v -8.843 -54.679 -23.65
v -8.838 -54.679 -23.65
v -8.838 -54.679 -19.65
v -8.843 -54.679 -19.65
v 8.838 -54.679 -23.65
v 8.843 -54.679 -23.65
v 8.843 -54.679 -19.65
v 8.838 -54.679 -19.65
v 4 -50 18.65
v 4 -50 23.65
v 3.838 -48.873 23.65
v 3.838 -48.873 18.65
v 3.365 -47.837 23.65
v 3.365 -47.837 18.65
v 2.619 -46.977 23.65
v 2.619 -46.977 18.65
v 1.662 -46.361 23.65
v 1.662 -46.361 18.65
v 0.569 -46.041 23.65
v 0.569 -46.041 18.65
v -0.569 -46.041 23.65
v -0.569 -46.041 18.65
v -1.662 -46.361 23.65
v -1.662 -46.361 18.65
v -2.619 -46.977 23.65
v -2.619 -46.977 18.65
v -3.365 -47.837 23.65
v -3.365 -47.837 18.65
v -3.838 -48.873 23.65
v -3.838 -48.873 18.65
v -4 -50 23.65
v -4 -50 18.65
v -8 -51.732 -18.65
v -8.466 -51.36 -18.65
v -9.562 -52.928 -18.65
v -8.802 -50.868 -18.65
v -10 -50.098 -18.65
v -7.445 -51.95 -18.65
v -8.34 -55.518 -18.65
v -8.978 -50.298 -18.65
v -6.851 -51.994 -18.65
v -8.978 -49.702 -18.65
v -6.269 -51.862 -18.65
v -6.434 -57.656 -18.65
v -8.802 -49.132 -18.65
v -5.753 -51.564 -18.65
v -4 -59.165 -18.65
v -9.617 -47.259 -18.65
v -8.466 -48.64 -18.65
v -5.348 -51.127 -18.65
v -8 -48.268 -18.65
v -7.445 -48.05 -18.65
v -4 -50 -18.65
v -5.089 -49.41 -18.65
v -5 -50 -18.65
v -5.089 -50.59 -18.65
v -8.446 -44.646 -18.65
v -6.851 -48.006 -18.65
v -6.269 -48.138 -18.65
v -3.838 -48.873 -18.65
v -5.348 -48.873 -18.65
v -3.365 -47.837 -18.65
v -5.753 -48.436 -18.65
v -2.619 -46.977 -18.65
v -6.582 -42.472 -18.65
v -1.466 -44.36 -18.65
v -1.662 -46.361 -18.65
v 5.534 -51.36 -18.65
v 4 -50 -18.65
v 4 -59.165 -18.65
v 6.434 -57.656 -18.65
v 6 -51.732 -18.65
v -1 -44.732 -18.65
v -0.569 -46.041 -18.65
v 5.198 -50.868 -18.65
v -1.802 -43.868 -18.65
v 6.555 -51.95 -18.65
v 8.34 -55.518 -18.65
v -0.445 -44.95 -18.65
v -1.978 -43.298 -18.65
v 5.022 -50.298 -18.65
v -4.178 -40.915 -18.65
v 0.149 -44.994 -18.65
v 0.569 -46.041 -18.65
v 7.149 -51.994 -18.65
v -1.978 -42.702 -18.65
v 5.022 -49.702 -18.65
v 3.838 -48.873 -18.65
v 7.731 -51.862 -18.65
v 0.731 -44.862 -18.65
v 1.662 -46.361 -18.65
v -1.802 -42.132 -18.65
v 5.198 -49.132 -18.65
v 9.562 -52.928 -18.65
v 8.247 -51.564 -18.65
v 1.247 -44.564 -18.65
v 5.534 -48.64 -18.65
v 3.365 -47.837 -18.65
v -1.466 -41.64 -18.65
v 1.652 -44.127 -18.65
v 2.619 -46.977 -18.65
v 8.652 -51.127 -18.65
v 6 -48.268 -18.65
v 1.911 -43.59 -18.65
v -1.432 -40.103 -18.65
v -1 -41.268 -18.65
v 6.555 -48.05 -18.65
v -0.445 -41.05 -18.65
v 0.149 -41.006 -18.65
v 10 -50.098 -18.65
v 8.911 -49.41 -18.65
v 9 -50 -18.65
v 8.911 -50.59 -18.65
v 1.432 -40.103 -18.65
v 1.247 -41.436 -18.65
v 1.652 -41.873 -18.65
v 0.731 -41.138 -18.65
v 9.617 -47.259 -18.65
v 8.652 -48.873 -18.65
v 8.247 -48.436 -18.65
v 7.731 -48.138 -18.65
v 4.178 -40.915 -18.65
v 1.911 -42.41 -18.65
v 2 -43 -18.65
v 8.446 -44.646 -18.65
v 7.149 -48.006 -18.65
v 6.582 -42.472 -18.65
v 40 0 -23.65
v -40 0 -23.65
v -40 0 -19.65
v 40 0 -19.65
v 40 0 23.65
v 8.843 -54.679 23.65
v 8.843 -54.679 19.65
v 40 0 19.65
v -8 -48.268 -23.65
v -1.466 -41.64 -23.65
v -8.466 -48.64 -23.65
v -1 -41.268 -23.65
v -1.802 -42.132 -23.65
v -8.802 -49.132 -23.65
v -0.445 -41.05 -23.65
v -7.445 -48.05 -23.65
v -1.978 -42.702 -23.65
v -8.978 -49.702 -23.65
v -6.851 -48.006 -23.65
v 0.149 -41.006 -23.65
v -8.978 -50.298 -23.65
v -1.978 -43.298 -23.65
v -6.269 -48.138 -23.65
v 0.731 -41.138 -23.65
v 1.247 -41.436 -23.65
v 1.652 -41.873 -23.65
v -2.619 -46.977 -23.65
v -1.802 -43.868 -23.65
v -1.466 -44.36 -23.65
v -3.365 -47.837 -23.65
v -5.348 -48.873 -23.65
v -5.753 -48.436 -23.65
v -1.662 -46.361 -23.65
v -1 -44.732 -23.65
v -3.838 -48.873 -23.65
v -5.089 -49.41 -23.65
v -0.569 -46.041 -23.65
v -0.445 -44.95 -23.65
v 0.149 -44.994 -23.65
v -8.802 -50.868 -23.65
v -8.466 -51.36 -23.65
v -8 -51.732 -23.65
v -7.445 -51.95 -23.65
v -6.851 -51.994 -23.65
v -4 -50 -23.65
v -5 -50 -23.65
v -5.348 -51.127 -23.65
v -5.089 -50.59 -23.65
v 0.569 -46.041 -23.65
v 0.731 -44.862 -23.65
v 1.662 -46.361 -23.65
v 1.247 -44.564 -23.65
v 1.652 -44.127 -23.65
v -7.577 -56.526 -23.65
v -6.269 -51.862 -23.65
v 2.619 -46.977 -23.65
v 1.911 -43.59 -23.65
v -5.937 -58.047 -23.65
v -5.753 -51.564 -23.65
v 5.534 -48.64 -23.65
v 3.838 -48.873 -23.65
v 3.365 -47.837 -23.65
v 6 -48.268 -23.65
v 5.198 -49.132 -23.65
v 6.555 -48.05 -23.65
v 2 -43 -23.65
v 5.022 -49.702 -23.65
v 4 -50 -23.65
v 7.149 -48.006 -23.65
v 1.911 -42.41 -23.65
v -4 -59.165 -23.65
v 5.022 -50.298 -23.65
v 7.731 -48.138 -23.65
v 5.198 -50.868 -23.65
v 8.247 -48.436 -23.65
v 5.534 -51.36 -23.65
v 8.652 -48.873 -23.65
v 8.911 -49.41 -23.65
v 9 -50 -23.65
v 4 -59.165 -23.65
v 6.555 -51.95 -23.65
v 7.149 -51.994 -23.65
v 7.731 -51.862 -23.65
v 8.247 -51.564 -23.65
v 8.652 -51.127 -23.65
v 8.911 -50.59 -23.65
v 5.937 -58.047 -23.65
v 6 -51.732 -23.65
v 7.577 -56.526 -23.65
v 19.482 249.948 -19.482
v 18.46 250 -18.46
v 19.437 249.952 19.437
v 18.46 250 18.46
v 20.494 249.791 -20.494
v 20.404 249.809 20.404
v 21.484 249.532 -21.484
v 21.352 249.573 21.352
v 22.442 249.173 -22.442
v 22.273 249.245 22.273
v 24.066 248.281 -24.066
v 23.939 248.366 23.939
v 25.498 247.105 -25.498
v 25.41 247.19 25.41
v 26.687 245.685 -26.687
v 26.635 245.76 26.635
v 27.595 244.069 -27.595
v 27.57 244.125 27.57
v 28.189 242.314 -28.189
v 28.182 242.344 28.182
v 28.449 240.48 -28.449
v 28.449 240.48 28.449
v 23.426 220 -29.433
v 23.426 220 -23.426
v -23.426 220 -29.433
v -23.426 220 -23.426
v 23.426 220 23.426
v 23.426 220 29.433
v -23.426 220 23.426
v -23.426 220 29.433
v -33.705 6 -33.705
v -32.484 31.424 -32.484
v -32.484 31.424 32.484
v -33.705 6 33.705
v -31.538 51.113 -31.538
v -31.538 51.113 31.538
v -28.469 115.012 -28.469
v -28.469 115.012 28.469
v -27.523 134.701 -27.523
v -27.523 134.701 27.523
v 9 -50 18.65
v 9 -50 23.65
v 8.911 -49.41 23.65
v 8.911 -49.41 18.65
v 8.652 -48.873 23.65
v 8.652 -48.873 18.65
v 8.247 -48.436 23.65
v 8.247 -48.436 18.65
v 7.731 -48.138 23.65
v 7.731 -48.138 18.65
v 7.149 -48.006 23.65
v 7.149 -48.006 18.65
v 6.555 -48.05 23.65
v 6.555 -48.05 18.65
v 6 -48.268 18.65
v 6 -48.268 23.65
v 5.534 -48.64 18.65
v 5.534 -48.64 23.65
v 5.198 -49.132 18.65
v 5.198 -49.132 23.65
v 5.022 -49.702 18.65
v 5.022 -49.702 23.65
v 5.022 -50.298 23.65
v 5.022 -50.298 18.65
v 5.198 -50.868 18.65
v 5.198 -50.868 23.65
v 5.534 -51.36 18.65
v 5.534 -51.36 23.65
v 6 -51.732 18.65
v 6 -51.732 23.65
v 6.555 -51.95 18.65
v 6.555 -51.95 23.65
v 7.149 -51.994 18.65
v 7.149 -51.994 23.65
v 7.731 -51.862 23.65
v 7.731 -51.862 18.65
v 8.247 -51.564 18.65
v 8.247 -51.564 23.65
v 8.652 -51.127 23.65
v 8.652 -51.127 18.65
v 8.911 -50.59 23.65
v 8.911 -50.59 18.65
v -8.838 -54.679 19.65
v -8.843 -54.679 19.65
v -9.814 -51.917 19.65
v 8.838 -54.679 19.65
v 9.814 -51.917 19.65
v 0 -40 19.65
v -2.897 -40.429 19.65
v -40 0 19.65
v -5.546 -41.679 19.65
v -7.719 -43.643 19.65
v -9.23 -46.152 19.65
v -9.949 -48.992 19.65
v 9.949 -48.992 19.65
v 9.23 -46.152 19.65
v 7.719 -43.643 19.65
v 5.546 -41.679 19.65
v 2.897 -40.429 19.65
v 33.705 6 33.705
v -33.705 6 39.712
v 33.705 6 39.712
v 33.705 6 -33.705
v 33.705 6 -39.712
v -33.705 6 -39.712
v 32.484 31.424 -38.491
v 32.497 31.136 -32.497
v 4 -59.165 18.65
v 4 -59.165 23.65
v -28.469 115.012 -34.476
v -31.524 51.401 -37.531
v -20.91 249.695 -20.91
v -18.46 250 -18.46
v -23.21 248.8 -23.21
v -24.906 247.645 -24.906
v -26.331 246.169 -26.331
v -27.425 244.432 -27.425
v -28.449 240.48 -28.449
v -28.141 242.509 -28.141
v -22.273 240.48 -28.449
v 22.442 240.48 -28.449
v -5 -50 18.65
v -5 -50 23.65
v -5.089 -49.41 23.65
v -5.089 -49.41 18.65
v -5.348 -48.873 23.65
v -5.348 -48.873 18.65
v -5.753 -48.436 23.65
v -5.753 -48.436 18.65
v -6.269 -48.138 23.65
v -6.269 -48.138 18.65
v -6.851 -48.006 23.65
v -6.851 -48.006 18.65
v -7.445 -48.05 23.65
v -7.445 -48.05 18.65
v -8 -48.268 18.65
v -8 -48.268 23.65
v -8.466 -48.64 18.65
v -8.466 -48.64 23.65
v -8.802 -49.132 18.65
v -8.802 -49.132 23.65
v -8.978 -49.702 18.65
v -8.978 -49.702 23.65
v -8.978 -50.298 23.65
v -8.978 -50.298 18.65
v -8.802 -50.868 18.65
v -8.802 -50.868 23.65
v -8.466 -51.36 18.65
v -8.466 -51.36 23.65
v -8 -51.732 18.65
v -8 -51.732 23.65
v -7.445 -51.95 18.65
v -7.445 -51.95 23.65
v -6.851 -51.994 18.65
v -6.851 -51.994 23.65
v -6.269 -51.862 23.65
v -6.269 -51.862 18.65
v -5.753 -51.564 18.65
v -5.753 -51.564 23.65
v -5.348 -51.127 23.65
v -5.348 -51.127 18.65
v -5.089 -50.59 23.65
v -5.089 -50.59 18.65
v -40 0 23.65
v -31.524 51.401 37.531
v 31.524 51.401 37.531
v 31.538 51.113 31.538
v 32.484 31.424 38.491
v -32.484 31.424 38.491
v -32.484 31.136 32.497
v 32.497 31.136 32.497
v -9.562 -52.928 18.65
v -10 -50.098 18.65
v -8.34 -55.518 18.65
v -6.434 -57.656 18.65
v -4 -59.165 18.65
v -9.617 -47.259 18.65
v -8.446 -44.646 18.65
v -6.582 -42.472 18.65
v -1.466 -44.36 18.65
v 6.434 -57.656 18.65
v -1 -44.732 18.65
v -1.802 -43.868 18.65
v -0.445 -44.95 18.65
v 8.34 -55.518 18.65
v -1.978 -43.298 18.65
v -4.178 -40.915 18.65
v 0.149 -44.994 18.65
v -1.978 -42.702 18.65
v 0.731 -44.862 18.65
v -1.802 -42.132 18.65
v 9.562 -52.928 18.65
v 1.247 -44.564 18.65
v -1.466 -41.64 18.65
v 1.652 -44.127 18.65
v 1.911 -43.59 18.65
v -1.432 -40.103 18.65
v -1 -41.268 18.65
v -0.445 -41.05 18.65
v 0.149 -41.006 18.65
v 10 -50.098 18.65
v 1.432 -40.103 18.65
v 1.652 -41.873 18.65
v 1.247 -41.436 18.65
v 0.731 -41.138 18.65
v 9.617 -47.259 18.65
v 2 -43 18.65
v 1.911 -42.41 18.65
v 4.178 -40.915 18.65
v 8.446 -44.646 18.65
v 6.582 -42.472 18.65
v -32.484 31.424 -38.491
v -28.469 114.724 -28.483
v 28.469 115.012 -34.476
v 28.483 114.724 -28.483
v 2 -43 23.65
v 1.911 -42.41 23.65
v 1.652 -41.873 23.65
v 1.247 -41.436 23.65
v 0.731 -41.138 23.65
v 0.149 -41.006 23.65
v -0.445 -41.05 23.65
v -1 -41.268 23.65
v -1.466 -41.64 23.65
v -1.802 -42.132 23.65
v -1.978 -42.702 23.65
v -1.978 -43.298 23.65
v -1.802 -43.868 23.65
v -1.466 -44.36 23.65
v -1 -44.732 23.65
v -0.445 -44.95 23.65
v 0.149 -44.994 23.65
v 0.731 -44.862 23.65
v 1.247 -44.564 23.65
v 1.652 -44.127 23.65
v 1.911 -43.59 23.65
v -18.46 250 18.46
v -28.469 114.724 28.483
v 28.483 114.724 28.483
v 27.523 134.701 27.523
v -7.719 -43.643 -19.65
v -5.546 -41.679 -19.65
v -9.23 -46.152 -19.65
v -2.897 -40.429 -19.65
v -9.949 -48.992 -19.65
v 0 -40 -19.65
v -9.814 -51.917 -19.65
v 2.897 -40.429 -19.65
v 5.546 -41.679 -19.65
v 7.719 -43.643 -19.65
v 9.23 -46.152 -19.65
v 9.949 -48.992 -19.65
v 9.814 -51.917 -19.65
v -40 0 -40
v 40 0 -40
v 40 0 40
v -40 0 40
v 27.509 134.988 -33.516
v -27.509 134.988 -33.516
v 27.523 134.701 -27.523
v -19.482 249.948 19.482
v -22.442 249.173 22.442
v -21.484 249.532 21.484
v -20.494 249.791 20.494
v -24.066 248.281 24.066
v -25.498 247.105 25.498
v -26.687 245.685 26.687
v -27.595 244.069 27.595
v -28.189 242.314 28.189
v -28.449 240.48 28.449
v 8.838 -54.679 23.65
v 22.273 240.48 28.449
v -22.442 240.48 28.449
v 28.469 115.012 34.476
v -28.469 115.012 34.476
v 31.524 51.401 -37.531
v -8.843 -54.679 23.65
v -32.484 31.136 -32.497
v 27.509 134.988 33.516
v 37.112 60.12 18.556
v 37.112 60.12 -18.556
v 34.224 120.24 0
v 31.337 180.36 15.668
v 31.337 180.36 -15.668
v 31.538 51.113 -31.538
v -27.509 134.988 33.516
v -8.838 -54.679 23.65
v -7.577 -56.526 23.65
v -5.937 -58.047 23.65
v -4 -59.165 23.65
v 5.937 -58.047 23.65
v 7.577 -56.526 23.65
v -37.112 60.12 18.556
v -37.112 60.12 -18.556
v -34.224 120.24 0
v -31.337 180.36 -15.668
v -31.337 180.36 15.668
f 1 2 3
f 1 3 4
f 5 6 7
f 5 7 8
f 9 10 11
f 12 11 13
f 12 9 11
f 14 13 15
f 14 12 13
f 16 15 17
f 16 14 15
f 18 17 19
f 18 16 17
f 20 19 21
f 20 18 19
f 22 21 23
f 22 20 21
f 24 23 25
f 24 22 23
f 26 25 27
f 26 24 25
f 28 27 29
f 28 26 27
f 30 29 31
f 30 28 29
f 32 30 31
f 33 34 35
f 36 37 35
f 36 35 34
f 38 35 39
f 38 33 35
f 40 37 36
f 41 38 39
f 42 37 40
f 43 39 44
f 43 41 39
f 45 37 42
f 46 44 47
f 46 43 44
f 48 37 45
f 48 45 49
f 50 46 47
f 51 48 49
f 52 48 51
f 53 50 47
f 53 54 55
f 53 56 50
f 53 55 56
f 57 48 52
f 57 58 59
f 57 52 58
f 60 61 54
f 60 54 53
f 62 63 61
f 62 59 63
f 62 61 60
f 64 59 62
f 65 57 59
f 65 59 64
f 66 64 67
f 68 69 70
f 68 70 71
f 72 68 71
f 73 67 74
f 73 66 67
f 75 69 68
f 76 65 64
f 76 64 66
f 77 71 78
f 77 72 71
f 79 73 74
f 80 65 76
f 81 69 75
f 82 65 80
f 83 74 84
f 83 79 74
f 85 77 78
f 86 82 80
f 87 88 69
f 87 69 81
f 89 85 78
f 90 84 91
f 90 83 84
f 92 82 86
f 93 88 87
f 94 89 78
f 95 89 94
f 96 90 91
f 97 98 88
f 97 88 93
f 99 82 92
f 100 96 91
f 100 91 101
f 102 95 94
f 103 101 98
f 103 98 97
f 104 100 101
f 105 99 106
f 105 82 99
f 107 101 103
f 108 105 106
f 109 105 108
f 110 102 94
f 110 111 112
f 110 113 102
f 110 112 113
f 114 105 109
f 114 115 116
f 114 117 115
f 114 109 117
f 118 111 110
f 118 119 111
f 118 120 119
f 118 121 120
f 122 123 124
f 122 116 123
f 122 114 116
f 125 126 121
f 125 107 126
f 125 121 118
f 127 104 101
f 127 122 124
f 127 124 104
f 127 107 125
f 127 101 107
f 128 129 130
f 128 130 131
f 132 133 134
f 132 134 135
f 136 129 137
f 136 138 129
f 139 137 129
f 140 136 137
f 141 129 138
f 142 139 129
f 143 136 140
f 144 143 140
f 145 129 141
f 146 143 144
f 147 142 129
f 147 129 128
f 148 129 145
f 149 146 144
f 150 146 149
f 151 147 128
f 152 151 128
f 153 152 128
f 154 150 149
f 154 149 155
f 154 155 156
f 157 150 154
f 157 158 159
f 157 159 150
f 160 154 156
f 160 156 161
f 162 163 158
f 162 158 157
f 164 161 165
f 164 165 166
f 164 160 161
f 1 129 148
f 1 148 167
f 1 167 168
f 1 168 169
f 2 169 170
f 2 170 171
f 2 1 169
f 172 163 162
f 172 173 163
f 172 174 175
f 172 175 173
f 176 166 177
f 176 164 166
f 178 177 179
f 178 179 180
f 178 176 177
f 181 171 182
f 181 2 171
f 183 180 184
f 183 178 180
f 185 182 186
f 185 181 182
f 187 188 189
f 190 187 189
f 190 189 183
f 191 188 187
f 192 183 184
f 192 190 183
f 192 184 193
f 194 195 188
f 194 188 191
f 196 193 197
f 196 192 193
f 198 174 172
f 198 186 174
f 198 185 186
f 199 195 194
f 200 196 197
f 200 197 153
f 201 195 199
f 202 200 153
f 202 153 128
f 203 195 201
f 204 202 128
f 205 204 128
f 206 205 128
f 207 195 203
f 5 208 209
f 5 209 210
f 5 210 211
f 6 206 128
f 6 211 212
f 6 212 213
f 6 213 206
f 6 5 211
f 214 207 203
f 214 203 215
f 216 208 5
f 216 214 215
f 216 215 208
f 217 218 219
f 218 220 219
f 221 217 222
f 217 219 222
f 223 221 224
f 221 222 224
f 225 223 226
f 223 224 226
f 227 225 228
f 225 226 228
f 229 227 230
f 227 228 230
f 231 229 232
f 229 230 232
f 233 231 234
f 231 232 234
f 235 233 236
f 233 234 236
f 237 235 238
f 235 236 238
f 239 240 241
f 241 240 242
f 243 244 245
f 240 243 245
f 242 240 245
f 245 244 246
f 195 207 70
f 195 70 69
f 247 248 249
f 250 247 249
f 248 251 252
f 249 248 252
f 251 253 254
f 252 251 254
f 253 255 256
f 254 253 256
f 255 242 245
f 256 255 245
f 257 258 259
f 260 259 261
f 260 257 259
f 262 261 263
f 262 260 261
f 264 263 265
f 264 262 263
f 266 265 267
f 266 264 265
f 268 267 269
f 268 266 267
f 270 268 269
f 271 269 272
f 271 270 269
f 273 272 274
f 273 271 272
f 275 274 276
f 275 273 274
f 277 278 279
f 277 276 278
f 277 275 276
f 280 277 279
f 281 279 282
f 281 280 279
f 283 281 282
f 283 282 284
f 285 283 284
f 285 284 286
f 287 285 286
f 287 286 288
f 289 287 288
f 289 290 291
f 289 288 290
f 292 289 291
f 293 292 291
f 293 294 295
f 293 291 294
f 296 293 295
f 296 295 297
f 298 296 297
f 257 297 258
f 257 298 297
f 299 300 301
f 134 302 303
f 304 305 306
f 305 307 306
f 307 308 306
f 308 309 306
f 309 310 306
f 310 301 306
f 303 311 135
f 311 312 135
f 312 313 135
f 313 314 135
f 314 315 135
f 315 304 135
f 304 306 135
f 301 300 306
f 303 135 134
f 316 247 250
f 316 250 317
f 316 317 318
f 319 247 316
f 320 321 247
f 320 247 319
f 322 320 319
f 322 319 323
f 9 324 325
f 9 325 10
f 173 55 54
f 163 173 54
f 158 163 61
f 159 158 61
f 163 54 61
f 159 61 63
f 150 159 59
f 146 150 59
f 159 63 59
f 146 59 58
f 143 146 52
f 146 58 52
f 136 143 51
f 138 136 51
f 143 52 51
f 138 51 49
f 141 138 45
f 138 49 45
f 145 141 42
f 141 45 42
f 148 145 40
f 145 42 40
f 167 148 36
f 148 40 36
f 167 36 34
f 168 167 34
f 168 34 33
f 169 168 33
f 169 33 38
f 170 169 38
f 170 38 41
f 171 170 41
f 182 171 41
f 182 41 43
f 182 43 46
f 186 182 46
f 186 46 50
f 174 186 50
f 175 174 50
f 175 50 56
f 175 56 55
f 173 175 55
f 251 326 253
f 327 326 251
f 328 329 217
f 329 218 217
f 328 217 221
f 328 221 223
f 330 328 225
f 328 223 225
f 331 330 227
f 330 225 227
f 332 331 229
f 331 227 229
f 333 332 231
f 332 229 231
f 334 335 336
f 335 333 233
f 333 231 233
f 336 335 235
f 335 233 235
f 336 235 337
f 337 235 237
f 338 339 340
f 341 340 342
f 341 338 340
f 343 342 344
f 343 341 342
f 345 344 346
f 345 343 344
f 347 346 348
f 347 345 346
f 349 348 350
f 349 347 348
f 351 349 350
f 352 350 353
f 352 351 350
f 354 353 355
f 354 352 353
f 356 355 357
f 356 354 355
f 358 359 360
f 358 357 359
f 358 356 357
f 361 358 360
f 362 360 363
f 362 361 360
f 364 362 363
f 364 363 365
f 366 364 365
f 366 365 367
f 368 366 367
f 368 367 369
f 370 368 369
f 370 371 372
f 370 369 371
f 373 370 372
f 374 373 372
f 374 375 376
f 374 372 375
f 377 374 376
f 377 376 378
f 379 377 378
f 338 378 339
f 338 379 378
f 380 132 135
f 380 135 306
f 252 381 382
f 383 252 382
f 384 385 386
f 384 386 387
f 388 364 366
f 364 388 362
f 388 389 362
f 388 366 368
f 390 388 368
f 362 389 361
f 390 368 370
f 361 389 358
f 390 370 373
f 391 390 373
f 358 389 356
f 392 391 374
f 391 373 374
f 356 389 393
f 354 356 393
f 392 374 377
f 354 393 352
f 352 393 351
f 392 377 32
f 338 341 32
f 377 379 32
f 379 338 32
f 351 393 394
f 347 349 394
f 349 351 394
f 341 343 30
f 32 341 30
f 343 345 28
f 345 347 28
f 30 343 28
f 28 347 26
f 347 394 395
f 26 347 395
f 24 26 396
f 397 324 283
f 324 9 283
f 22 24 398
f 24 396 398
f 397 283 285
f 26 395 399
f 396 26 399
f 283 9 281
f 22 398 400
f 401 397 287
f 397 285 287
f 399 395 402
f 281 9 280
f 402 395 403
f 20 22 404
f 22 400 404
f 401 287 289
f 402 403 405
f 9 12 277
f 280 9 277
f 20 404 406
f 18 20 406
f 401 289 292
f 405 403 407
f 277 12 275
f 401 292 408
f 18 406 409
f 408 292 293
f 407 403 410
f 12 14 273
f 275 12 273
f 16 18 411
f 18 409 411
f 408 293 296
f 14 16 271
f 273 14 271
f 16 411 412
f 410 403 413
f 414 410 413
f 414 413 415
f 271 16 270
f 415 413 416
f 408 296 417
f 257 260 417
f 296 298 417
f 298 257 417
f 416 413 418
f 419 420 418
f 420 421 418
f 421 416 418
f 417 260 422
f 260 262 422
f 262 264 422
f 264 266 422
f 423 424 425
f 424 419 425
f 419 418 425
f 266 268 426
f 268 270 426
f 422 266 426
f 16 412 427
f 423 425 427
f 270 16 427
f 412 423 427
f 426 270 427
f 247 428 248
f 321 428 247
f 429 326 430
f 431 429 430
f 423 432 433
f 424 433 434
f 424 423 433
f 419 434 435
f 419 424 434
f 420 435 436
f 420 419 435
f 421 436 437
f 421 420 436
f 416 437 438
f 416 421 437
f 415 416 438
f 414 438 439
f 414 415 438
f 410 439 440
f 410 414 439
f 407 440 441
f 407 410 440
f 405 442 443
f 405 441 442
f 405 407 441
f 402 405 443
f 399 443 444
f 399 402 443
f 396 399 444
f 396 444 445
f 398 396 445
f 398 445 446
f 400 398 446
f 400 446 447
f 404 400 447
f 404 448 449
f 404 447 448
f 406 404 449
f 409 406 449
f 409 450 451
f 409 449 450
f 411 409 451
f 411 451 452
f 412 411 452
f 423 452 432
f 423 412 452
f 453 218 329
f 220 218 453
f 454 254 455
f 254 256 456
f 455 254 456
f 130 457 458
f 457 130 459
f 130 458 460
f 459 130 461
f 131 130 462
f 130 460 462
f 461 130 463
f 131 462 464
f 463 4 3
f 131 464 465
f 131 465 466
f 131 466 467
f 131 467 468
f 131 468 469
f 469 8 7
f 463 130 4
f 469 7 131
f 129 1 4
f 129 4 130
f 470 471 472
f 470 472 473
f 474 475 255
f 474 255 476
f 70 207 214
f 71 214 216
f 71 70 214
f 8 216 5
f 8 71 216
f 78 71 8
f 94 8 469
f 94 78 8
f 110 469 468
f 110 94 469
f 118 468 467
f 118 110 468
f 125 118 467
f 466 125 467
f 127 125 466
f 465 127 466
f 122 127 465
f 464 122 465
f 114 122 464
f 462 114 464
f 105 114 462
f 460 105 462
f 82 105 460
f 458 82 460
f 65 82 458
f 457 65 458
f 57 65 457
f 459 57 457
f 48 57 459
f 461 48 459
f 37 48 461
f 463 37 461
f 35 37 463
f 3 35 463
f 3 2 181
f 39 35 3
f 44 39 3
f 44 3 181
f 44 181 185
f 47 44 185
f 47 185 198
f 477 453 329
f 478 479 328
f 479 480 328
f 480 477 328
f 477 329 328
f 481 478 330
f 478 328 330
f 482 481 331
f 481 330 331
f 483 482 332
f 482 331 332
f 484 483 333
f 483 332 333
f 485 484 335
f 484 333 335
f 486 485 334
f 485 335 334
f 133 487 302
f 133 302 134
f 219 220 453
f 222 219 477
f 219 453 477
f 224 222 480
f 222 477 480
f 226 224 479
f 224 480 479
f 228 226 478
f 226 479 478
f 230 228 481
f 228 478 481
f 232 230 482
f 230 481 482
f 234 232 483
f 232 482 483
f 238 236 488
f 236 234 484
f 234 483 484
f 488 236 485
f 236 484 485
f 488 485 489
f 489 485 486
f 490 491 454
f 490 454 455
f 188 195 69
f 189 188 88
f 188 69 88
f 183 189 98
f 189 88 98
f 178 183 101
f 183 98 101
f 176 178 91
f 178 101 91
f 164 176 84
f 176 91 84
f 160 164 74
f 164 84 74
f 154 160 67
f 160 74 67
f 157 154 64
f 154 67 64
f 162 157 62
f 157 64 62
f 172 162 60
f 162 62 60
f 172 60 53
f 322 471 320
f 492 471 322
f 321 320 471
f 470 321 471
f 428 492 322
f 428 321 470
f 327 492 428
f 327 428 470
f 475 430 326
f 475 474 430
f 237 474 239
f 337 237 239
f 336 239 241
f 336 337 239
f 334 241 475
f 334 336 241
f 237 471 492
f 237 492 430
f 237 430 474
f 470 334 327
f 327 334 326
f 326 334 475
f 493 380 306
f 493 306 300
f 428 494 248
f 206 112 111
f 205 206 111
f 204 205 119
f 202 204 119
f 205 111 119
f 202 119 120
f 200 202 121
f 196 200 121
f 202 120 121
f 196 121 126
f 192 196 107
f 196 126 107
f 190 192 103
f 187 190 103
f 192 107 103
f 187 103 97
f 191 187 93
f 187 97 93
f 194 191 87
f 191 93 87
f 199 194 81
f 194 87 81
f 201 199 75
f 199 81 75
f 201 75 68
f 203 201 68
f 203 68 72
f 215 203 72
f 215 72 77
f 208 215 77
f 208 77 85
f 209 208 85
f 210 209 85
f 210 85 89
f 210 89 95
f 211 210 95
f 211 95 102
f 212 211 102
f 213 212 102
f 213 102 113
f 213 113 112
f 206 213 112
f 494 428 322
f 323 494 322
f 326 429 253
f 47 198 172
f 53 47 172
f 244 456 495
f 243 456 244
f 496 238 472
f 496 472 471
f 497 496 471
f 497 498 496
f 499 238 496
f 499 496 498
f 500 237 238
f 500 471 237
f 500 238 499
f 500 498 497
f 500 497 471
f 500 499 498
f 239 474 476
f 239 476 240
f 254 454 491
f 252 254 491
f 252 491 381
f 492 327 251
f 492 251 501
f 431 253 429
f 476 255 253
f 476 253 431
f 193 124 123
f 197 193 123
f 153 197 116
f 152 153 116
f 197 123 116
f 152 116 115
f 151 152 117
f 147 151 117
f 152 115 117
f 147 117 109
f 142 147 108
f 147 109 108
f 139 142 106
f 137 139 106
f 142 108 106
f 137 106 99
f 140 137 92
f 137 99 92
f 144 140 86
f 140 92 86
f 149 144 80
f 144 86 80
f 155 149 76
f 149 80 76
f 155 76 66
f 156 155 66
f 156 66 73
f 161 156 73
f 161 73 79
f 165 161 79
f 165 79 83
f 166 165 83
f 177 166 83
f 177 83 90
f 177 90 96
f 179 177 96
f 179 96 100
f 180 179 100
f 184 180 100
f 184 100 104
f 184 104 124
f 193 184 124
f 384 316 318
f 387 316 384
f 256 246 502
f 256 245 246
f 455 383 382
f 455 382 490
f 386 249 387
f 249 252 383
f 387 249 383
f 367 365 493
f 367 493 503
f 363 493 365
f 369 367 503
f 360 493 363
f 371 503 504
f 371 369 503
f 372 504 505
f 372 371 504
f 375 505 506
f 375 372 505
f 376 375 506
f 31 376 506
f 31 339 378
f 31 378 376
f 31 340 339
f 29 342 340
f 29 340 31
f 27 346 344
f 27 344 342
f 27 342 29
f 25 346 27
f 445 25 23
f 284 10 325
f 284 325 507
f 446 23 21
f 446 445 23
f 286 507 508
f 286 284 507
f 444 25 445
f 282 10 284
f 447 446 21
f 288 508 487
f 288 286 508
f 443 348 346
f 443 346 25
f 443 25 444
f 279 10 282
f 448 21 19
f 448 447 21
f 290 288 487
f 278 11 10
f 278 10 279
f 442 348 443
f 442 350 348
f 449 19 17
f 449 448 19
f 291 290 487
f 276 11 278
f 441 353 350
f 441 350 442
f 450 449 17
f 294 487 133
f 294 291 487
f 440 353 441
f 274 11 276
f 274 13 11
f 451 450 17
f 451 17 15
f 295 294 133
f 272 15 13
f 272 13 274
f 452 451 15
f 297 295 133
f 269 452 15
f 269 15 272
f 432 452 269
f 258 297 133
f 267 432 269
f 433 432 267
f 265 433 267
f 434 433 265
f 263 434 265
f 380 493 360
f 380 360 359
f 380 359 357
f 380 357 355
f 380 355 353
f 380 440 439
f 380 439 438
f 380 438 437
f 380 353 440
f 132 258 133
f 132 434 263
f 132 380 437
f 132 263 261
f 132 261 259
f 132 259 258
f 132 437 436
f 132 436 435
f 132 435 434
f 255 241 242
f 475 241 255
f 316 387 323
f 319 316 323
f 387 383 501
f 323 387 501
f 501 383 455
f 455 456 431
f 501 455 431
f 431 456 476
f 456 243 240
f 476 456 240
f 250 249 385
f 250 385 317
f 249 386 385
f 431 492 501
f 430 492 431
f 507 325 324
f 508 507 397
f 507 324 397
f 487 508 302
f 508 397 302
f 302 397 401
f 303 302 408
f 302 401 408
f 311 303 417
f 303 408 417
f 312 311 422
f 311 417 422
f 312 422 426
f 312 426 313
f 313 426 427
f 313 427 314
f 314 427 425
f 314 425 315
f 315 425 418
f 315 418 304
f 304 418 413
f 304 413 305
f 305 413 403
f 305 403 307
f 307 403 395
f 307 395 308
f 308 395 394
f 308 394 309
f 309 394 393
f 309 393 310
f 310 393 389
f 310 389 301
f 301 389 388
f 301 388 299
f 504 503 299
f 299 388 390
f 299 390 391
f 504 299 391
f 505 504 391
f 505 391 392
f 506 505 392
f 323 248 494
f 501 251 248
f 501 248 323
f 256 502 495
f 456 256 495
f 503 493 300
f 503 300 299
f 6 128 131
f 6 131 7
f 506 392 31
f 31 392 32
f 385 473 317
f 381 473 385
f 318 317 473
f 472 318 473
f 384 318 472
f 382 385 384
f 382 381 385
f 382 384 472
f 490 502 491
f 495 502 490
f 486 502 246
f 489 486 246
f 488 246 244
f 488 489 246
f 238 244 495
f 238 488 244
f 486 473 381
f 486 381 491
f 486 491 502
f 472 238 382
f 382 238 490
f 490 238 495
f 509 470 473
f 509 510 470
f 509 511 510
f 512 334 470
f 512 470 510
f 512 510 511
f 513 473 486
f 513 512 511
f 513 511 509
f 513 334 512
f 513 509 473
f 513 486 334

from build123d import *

# Parameters (mm, degrees)
CROQUIS3_W                 = 80
CROQUIS3_H                 = 80
SALIENTE_EXTRUIR2_DEPTH    = 250
SALIENTE_EXTRUIR2_TAPER    = 2.75
VACIADO1_T                 = 6
CORTAR_EXTRUIR6_DEPTH      = 50
CORTAR_EXTRUIR6_DEPTH_BACK = 50
CROQUIS26_W                = 70.014697611
CROQUIS26_H                = 20
CROQUIS26_W_2              = 61.984721231
SALIENTE_EXTRUIR4_DEPTH    = 6
CROQUIS29_W                = 55.983277758
CROQUIS29_H                = 55.983277758
SALIENTE_EXTRUIR5_DEPTH    = 30
SALIENTE_EXTRUIR5_DRAFT    = 2.75
CROQUIS31_R                = 10
SALIENTE_EXTRUIR6_DEPTH    = 5
SALIENTE_EXTRUIR7_DEPTH    = 4
CROQUIS31_3_R              = 4
CROQUIS31_3_R_2            = 2
CORTAR_EXTRUIR10_DEPTH     = 6
CROQUIS33_R                = 10
SALIENTE_EXTRUIR8_DEPTH    = 5
SALIENTE_EXTRUIR9_DEPTH    = 4
CROQUIS33_3_R              = 2
CROQUIS33_3_R_2            = 4
CORTAR_EXTRUIR11_DEPTH     = 6
FILLET2_R                  = 10
CORTAR_EXTRUIR12_START     = -47.3
CROQUIS35_W                = 8
CROQUIS35_H                = 20.741669121
CORTAR_EXTRUIR12_DEPTH     = 47.3


with BuildPart() as part:
    # Croquis3 → Saliente-Extruir2 (new body)
    with BuildSketch(Plane(origin=(0, 0, 0), x_dir=(-1, 0, 0), z_dir=(0, 1, 0))):
        Rectangle(CROQUIS3_W, CROQUIS3_H)
    extrude(amount=SALIENTE_EXTRUIR2_DEPTH, taper=SALIENTE_EXTRUIR2_TAPER)

    # Vaciado1 (no face opened: a closed hollow body)
    add(offset(amount=-VACIADO1_T, mode=Mode.PRIVATE), mode=Mode.SUBTRACT)

    # Croquis24 → Cortar-Extruir6 (cut, two sides: drawn at the far end of the back side and taken through both)
    with BuildSketch(Plane(origin=(0, 0, 0), x_dir=(0, 1, 0), z_dir=(0, 0, 1)).offset(-CORTAR_EXTRUIR6_DEPTH_BACK)):
        Polygon((6, 33.704881686), (6, -33.704881686), (244, -22.272921898), (244, 22.272921898), align=None)
    extrude(amount=CORTAR_EXTRUIR6_DEPTH + CORTAR_EXTRUIR6_DEPTH_BACK, mode=Mode.SUBTRACT)

    # Croquis26 → Saliente-Extruir4 (add)
    with BuildSketch(Plane(origin=(0, 1.91691505, 39.907923967), x_dir=(1, 0, 0), z_dir=(0, 0.04797812852134405, 0.9988483864849507))):
        with Locations((2.523677538, 39.541274251)):
            Rectangle(CROQUIS26_W, CROQUIS26_H)
        with Locations((2.523677538, 123.224992516)):
            Rectangle(CROQUIS26_W_2, CROQUIS26_H)
    saliente_extruir4 = extrude(amount=-SALIENTE_EXTRUIR4_DEPTH)

    # Simetría1: Saliente-Extruir4 across plane
    add(saliente_extruir4.mirror(Plane.XY))


with BuildPart() as saliente_extruir5_tool:
    # Croquis29 → Saliente-Extruir5 (with draft: the straight prism first)
    with BuildSketch(Plane(origin=(0, 250, 0), x_dir=(-1, 0, 0), z_dir=(0, 1, 0))):
        Rectangle(CROQUIS29_W, CROQUIS29_H)
    extrude(amount=-SALIENTE_EXTRUIR5_DEPTH)
    # Saliente-Extruir5: the draft: its side faces are tilted about the plane it starts from
    saliente_extruir5_sides = [saliente_extruir5_tool.faces().sort_by_distance(p)[0] for p in [
        (27.991638879, 235, 0),
        (0, 235, -27.991638879),
        (-27.991638879, 235, 0),
        (0, 235, 27.991638879),
    ]]
    draft(saliente_extruir5_sides, Plane(origin=(0, 250, 0), x_dir=(-1, 0, 0), z_dir=(0, 1, 0)), SALIENTE_EXTRUIR5_DRAFT)


with BuildPart() as part_1:
    add(part.part)

    # Saliente-Extruir5: add saliente_extruir5_tool
    add(saliente_extruir5_tool.part)

    # Fillet2
    # the kernel refuses this fillet: 10 mm, written as the material it takes off along each edge
    with BuildSketch(Plane(origin=(27.991638879, 250, 51.819626298), x_dir=(0.04797812852134406, -0.9988483864849508, 0), z_dir=(0, 0, -1))) as fillet2_piece_1:
        with BuildLine():
            CenterArc((FILLET2_R * 0.953119496773, FILLET2_R), FILLET2_R, 182.75, 87.25)
            Line((-FILLET2_R * 0.0457288897124, FILLET2_R * 0.952021871479), (0, 0))
            Line((0, 0), (FILLET2_R * 0.953119496773, 0))
        make_face()
    extrude(amount=103.639252596, mode=Mode.SUBTRACT)
    with BuildSketch(Plane(origin=(51.819626298, 250, -27.991638879), x_dir=(0, -0.9988483864849508, -0.04797812852134406), z_dir=(-1, 0, 0))) as fillet2_piece_2:
        with BuildLine():
            CenterArc((FILLET2_R * 0.953119496773, FILLET2_R), FILLET2_R, 182.75, 87.25)
            Line((-FILLET2_R * 0.0457288897124, FILLET2_R * 0.952021871479), (0, 0))
            Line((0, 0), (FILLET2_R * 0.953119496773, 0))
        make_face()
    extrude(amount=29.377616399, mode=Mode.SUBTRACT)
    with BuildSketch(Plane(origin=(22.442009899, 250, -27.991638879), x_dir=(0, -0.9988483864849506, -0.04797812852134443), z_dir=(-1, 0, 0))) as fillet2_piece_3:
        with BuildLine():
            CenterArc((9.531194968, 10), FILLET2_R, 182.75, 87.25)
            Line((-0.457288897, 9.520218715), (-1.456137284, 9.472240586))
            Line((-1.456137284, 9.472240586), (-0.953119497, -1))
            Line((-0.953119497, -1), (9.531194968, -1))
            Line((9.531194968, -1), (9.531194968, 0))
        make_face()
    extrude(amount=44.714932797, mode=Mode.SUBTRACT)
    with BuildSketch(Plane(origin=(-22.272922898, 250, -27.991638879), x_dir=(0, -0.9988483864849508, -0.04797812852134406), z_dir=(-1, 0, 0))) as fillet2_piece_4:
        with BuildLine():
            CenterArc((FILLET2_R * 0.953119496773, FILLET2_R), FILLET2_R, 182.75, 87.25)
            Line((-FILLET2_R * 0.0457288897124, FILLET2_R * 0.952021871479), (0, 0))
            Line((0, 0), (FILLET2_R * 0.953119496773, 0))
        make_face()
    extrude(amount=29.5467034, mode=Mode.SUBTRACT)
    with BuildSketch(Plane(origin=(-27.991638879, 250, -51.819626298), x_dir=(1, 0, 0), z_dir=(0, 0, 1))) as fillet2_piece_5:
        with BuildLine():
            CenterArc((FILLET2_R * 0.953119496773, -FILLET2_R), FILLET2_R, 90, 87.25)
            Line((-FILLET2_R * 0.0457288897124, -FILLET2_R * 0.952021871479), (0, 0))
            Line((0, 0), (FILLET2_R * 0.953119496773, 0))
        make_face()
    extrude(amount=103.639252596, mode=Mode.SUBTRACT)
    with BuildSketch(Plane(origin=(-51.819626298, 250, 27.991638879), x_dir=(0, 0, -1), z_dir=(1, 0, 0))) as fillet2_piece_6:
        with BuildLine():
            CenterArc((FILLET2_R * 0.953119496773, -FILLET2_R), FILLET2_R, 90, 87.25)
            Line((-FILLET2_R * 0.0457288897124, -FILLET2_R * 0.952021871479), (0, 0))
            Line((0, 0), (FILLET2_R * 0.953119496773, 0))
        make_face()
    extrude(amount=29.377616399, mode=Mode.SUBTRACT)
    with BuildSketch(Plane(origin=(-22.442009899, 250, 27.991638879), x_dir=(0, 0, -1), z_dir=(1, 0, 0))) as fillet2_piece_7:
        with BuildLine():
            CenterArc((9.531194968, -10), FILLET2_R, 90, 87.25)
            Line((-0.457288897, -9.520218715), (-1.456137284, -9.472240586))
            Line((-1.456137284, -9.472240586), (-0.953119497, 1))
            Line((-0.953119497, 1), (9.531194968, 1))
            Line((9.531194968, 1), (9.531194968, 0))
        make_face()
    extrude(amount=44.714932797, mode=Mode.SUBTRACT)
    with BuildSketch(Plane(origin=(22.272922898, 250, 27.991638879), x_dir=(0, 0, -1), z_dir=(1, 0, 0))) as fillet2_piece_8:
        with BuildLine():
            CenterArc((FILLET2_R * 0.953119496773, -FILLET2_R), FILLET2_R, 90, 87.25)
            Line((-FILLET2_R * 0.0457288897124, -FILLET2_R * 0.952021871479), (0, 0))
            Line((0, 0), (FILLET2_R * 0.953119496773, 0))
        make_face()
    extrude(amount=29.5467034, mode=Mode.SUBTRACT)


with BuildPart() as body_2:
    # Croquis31 → Saliente-Extruir6 (new body)
    with BuildSketch(Plane(origin=(0, 0, 18.65), x_dir=(0, 1, 0), z_dir=(0, 0, 1))):
        with Locations(Location((-50, 0, 0), (0, 0, 270))):
            Circle(CROQUIS31_R)
    extrude(amount=SALIENTE_EXTRUIR6_DEPTH)

    # Croquis32 → Saliente-Extruir7 (add)
    with BuildSketch(Plane.XY.offset(23.65)):
        Polygon((-40, 0), (-8.843447734, -54.678825581), (8.843447734, -54.678825581), (40, 0), align=None)
    extrude(amount=-SALIENTE_EXTRUIR7_DEPTH)

    # Croquis31<3> → Cortar-Extruir10 (cut)
    with BuildSketch(Plane(origin=(0, 0, 18.65), x_dir=(0, 1, 0), z_dir=(0, 0, 1))):
        with Locations(Location((-50, 0, 0), (0, 0, 270))):
            Circle(CROQUIS31_3_R)
        with Locations(Location((-50, 7, 0), (0, 0, 270))):
            Circle(CROQUIS31_3_R_2)
        with Locations(Location((-43, 0, 0), (0, 0, 270))):
            Circle(CROQUIS31_3_R_2)
        with Locations(Location((-50, -7, 0), (0, 0, 270))):
            Circle(CROQUIS31_3_R_2)
        with Locations(Location((-57, 0, 0), (0, 0, 270))):
            Circle(CROQUIS31_3_R_2)
    extrude(amount=CORTAR_EXTRUIR10_DEPTH, mode=Mode.SUBTRACT)


with BuildPart() as body_3:
    # Croquis33 → Saliente-Extruir8 (new body)
    with BuildSketch(Plane(origin=(0, 0, -18.65), x_dir=(0, 1, 0), z_dir=(0, 0, 1))):
        with Locations(Location((-50, 0, 0), (0, 0, 270))):
            Circle(CROQUIS33_R)
    extrude(amount=-SALIENTE_EXTRUIR8_DEPTH)

    # Croquis34 → Saliente-Extruir9 (add)
    with BuildSketch(Plane(origin=(0, 0, -23.65), x_dir=(1, 0, 0), z_dir=(0, 0, -1))):
        Polygon((-8.843447734, 54.678825581), (-40, 0), (40, 0), (8.843447734, 54.678825581), align=None)
    extrude(amount=-SALIENTE_EXTRUIR9_DEPTH)

    # Croquis33<3> → Cortar-Extruir11 (cut)
    with BuildSketch(Plane(origin=(0, 0, -18.65), x_dir=(0, 1, 0), z_dir=(0, 0, 1))):
        with Locations(Location((-43, 0, 0), (0, 0, 270))):
            Circle(CROQUIS33_3_R)
        with Locations(Location((-57, 0, 0), (0, 0, 270))):
            Circle(CROQUIS33_3_R)
        with Locations(Location((-50, -7, 0), (0, 0, 270))):
            Circle(CROQUIS33_3_R)
        with Locations(Location((-50, 7, 0), (0, 0, 270))):
            Circle(CROQUIS33_3_R)
        with Locations(Location((-50, 0, 0), (0, 0, 270))):
            Circle(CROQUIS33_3_R_2)
    extrude(amount=-CORTAR_EXTRUIR11_DEPTH, mode=Mode.SUBTRACT)


with BuildPart() as cortar_extruir12_tool:
    # Croquis35 → Cortar-Extruir12 (new body)
    with BuildSketch(Plane.XY.offset(23.65).offset(CORTAR_EXTRUIR12_START)):
        with Locations((0, -60.370834561)):
            Rectangle(CROQUIS35_W, CROQUIS35_H)
    extrude(amount=CORTAR_EXTRUIR12_DEPTH)


with BuildPart() as body_2_1:
    add(body_2.part)

    # Cortar-Extruir12: cut by cortar_extruir12_tool
    add(cortar_extruir12_tool.part, mode=Mode.SUBTRACT)


with BuildPart() as body_3_1:
    add(body_3.part)

    # Cortar-Extruir12: cut by cortar_extruir12_tool
    add(cortar_extruir12_tool.part, mode=Mode.SUBTRACT)


solid = Compound([part_1.part, body_2_1.part, body_3_1.part])
